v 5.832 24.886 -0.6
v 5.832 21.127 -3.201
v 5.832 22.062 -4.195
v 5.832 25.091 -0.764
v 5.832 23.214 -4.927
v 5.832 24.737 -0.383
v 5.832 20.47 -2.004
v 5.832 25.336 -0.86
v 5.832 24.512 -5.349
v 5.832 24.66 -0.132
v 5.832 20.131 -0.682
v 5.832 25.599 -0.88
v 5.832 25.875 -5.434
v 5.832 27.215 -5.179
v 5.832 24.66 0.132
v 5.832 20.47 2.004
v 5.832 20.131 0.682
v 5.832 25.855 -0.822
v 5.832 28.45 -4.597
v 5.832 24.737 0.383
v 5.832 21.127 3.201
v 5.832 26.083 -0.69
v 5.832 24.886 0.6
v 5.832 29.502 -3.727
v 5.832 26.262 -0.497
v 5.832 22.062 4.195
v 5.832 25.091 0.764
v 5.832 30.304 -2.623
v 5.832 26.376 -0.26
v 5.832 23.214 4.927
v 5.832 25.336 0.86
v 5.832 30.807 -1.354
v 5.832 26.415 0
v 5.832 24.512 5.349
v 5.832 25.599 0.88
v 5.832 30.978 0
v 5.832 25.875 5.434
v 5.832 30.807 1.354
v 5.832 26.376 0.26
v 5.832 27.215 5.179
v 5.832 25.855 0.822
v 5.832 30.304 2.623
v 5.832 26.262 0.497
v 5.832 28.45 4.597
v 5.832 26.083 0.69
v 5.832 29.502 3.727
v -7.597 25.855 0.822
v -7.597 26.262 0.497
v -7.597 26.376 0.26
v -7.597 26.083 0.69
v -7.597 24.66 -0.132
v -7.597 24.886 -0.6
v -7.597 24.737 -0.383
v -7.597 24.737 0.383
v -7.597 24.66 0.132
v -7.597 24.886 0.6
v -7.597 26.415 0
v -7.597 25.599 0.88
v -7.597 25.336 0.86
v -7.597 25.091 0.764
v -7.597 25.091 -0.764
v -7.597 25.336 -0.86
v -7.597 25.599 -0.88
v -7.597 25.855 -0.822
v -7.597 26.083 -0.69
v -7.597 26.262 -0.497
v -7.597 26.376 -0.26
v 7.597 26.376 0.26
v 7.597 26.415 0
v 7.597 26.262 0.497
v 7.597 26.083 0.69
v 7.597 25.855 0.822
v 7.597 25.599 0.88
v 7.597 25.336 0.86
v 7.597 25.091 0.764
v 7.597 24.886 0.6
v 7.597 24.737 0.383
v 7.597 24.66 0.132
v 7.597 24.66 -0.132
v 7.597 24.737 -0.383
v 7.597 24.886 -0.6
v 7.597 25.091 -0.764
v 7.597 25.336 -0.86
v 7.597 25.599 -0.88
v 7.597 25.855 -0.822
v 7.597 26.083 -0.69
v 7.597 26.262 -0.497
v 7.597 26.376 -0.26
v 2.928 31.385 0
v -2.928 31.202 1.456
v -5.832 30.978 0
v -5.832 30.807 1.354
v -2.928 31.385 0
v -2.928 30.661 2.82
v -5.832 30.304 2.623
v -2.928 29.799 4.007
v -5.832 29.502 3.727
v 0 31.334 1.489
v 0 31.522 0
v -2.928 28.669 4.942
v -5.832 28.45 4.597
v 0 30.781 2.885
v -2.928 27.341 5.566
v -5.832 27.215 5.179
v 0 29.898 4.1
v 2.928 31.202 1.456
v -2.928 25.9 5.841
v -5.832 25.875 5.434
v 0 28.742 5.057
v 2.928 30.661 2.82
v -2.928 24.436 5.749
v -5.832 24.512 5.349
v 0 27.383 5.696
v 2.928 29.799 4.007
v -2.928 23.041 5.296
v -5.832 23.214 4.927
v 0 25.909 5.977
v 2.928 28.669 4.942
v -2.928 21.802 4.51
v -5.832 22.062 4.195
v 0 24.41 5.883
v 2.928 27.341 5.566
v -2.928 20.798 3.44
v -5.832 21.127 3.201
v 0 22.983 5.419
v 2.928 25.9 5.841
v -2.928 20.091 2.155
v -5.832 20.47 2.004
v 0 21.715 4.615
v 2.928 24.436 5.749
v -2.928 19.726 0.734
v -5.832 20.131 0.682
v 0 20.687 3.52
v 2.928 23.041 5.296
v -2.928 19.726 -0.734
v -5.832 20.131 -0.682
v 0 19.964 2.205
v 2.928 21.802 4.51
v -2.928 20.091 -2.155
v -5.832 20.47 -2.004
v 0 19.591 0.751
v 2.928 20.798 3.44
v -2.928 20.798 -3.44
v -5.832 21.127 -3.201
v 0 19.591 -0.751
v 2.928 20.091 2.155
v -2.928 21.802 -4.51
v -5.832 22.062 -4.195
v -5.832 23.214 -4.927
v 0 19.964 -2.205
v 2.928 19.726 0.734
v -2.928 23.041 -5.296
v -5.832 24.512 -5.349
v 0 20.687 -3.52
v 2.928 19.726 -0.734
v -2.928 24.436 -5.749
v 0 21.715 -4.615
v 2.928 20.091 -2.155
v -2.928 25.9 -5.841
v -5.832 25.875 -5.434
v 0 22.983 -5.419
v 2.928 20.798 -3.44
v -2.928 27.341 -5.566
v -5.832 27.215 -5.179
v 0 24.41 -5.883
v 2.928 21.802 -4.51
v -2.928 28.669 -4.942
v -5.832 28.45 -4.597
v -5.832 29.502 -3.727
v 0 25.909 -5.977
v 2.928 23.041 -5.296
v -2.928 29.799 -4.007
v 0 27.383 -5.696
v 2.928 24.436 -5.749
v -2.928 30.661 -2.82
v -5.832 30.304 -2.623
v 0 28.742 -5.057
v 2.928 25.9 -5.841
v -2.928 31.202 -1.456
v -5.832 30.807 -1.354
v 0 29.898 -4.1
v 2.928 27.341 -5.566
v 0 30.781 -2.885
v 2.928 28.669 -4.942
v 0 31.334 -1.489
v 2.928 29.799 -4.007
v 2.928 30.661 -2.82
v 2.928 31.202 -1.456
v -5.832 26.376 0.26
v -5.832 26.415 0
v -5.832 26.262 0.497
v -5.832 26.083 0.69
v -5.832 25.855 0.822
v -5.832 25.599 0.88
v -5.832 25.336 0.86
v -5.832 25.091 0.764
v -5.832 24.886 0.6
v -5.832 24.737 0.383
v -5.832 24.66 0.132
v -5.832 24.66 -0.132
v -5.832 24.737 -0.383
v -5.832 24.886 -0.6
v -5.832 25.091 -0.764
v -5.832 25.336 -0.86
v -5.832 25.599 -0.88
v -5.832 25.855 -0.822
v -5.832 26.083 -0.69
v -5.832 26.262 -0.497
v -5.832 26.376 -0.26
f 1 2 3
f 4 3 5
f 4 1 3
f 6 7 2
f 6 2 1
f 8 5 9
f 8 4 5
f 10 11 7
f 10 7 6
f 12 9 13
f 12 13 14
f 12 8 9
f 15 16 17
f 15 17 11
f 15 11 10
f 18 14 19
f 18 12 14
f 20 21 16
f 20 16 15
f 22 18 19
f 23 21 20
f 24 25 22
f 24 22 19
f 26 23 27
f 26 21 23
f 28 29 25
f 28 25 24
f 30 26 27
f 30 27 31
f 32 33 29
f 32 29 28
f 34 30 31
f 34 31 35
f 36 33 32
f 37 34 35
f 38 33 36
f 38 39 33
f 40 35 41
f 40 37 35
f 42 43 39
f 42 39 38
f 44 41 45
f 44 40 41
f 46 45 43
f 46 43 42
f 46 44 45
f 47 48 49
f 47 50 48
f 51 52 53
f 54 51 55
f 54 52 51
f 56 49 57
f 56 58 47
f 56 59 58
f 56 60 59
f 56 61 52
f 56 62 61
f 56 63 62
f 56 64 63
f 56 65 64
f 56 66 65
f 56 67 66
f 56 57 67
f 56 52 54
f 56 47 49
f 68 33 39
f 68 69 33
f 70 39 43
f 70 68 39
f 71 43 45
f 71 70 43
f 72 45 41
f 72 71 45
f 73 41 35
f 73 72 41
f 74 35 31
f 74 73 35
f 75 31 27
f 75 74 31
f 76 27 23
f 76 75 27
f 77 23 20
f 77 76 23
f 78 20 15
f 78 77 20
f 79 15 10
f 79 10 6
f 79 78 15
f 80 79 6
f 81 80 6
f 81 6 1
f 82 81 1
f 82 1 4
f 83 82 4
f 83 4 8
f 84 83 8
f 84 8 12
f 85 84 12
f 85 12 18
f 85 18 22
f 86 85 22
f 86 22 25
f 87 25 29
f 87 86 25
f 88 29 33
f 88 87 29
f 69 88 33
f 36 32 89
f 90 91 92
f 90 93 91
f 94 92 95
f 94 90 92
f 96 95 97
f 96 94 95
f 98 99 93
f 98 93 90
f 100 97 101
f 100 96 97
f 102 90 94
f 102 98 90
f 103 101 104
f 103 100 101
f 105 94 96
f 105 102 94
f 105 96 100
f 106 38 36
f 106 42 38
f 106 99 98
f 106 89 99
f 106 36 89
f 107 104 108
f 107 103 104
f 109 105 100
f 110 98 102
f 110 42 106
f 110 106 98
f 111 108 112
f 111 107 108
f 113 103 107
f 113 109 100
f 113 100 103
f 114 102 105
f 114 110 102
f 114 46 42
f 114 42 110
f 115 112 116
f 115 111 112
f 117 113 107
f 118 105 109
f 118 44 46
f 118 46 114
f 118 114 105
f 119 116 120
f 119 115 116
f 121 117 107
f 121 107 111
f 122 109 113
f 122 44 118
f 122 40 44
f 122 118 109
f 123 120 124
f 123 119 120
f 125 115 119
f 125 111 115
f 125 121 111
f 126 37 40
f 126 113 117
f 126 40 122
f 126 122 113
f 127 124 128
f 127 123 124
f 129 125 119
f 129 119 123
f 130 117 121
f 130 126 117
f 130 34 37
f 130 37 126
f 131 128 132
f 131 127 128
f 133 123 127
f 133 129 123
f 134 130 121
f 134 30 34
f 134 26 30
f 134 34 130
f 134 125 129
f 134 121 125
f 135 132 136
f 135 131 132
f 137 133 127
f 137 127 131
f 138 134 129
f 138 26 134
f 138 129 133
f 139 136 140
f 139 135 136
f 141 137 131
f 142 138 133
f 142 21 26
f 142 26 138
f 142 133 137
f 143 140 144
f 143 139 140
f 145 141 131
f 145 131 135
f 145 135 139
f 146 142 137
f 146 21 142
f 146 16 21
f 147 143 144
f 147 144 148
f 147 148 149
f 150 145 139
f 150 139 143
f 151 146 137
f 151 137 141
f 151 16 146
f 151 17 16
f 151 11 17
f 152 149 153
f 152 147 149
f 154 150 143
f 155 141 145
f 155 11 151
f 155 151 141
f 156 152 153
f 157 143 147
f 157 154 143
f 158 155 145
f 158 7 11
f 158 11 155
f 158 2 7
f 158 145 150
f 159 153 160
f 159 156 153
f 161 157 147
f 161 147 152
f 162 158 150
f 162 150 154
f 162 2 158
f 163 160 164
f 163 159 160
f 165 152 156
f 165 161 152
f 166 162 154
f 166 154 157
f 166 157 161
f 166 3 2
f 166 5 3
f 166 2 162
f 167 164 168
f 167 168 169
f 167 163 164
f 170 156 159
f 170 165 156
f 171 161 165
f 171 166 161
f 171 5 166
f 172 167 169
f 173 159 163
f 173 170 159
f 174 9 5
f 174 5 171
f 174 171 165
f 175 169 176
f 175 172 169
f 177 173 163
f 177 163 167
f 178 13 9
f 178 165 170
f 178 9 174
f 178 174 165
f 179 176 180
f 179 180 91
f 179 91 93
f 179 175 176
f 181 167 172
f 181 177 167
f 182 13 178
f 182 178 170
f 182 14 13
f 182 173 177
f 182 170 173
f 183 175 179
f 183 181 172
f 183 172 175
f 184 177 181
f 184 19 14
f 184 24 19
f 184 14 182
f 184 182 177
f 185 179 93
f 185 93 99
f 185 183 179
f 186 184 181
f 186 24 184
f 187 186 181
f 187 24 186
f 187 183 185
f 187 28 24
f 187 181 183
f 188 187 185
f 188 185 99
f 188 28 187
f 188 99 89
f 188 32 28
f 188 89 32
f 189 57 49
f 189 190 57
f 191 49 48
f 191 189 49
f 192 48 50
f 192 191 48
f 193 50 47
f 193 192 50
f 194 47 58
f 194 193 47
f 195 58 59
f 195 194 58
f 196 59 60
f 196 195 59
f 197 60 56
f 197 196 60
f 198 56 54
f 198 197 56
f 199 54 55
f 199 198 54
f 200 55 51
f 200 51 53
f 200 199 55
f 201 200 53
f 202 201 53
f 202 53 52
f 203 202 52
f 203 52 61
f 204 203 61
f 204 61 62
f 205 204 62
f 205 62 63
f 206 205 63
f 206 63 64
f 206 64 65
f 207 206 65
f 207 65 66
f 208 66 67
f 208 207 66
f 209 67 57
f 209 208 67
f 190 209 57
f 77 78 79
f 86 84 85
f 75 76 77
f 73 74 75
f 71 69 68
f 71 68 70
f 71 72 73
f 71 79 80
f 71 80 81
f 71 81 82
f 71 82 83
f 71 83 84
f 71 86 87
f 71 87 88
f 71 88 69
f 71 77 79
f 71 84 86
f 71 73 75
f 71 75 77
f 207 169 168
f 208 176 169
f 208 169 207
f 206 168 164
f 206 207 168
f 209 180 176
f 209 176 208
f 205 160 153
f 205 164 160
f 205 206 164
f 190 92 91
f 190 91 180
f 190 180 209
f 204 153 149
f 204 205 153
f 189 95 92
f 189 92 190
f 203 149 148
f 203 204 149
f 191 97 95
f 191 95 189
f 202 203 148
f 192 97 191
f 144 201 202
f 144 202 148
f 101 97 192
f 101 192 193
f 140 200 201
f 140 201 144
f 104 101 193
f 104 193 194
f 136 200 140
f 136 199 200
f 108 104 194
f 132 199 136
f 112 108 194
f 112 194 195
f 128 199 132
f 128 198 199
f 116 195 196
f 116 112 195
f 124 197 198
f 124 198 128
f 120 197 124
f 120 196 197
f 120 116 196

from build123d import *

# Parameters (mm, degrees)
SCALE1_SCALE = 0.630434783


with BuildPart() as part:
    # Sketch1 → Revolve1 (revolve)
    with BuildSketch(Plane.XY):
        with BuildLine():
            Line((9.25, 49.136926033), (9.25, 41.9))
            Line((9.25, 41.9), (12.05, 41.9))
            Line((12.05, 41.9), (12.05, 40.5))
            Line((12.05, 40.5), (9.25, 40.5))
            Line((9.25, 40.5), (-9.25, 40.5))
            Line((-9.25, 40.5), (-12.05, 40.5))
            Line((-12.05, 40.5), (-12.05, 41.9))
            Line((-12.05, 41.9), (-9.25, 41.9))
            Line((-9.25, 41.9), (-9.25, 49.136926033))
            ThreePointArc((-9.25, 49.136926033), (0, 50), (9.25, 49.136926033))
        make_face()
    revolve(axis=Axis((-9.25, 40.5, 0), (1, 0, 0)))


with BuildPart() as part_1:
    # Scale1: scaled about (0, 0, 0)
    add(part.part.scale(SCALE1_SCALE))


solid = part_1.part
